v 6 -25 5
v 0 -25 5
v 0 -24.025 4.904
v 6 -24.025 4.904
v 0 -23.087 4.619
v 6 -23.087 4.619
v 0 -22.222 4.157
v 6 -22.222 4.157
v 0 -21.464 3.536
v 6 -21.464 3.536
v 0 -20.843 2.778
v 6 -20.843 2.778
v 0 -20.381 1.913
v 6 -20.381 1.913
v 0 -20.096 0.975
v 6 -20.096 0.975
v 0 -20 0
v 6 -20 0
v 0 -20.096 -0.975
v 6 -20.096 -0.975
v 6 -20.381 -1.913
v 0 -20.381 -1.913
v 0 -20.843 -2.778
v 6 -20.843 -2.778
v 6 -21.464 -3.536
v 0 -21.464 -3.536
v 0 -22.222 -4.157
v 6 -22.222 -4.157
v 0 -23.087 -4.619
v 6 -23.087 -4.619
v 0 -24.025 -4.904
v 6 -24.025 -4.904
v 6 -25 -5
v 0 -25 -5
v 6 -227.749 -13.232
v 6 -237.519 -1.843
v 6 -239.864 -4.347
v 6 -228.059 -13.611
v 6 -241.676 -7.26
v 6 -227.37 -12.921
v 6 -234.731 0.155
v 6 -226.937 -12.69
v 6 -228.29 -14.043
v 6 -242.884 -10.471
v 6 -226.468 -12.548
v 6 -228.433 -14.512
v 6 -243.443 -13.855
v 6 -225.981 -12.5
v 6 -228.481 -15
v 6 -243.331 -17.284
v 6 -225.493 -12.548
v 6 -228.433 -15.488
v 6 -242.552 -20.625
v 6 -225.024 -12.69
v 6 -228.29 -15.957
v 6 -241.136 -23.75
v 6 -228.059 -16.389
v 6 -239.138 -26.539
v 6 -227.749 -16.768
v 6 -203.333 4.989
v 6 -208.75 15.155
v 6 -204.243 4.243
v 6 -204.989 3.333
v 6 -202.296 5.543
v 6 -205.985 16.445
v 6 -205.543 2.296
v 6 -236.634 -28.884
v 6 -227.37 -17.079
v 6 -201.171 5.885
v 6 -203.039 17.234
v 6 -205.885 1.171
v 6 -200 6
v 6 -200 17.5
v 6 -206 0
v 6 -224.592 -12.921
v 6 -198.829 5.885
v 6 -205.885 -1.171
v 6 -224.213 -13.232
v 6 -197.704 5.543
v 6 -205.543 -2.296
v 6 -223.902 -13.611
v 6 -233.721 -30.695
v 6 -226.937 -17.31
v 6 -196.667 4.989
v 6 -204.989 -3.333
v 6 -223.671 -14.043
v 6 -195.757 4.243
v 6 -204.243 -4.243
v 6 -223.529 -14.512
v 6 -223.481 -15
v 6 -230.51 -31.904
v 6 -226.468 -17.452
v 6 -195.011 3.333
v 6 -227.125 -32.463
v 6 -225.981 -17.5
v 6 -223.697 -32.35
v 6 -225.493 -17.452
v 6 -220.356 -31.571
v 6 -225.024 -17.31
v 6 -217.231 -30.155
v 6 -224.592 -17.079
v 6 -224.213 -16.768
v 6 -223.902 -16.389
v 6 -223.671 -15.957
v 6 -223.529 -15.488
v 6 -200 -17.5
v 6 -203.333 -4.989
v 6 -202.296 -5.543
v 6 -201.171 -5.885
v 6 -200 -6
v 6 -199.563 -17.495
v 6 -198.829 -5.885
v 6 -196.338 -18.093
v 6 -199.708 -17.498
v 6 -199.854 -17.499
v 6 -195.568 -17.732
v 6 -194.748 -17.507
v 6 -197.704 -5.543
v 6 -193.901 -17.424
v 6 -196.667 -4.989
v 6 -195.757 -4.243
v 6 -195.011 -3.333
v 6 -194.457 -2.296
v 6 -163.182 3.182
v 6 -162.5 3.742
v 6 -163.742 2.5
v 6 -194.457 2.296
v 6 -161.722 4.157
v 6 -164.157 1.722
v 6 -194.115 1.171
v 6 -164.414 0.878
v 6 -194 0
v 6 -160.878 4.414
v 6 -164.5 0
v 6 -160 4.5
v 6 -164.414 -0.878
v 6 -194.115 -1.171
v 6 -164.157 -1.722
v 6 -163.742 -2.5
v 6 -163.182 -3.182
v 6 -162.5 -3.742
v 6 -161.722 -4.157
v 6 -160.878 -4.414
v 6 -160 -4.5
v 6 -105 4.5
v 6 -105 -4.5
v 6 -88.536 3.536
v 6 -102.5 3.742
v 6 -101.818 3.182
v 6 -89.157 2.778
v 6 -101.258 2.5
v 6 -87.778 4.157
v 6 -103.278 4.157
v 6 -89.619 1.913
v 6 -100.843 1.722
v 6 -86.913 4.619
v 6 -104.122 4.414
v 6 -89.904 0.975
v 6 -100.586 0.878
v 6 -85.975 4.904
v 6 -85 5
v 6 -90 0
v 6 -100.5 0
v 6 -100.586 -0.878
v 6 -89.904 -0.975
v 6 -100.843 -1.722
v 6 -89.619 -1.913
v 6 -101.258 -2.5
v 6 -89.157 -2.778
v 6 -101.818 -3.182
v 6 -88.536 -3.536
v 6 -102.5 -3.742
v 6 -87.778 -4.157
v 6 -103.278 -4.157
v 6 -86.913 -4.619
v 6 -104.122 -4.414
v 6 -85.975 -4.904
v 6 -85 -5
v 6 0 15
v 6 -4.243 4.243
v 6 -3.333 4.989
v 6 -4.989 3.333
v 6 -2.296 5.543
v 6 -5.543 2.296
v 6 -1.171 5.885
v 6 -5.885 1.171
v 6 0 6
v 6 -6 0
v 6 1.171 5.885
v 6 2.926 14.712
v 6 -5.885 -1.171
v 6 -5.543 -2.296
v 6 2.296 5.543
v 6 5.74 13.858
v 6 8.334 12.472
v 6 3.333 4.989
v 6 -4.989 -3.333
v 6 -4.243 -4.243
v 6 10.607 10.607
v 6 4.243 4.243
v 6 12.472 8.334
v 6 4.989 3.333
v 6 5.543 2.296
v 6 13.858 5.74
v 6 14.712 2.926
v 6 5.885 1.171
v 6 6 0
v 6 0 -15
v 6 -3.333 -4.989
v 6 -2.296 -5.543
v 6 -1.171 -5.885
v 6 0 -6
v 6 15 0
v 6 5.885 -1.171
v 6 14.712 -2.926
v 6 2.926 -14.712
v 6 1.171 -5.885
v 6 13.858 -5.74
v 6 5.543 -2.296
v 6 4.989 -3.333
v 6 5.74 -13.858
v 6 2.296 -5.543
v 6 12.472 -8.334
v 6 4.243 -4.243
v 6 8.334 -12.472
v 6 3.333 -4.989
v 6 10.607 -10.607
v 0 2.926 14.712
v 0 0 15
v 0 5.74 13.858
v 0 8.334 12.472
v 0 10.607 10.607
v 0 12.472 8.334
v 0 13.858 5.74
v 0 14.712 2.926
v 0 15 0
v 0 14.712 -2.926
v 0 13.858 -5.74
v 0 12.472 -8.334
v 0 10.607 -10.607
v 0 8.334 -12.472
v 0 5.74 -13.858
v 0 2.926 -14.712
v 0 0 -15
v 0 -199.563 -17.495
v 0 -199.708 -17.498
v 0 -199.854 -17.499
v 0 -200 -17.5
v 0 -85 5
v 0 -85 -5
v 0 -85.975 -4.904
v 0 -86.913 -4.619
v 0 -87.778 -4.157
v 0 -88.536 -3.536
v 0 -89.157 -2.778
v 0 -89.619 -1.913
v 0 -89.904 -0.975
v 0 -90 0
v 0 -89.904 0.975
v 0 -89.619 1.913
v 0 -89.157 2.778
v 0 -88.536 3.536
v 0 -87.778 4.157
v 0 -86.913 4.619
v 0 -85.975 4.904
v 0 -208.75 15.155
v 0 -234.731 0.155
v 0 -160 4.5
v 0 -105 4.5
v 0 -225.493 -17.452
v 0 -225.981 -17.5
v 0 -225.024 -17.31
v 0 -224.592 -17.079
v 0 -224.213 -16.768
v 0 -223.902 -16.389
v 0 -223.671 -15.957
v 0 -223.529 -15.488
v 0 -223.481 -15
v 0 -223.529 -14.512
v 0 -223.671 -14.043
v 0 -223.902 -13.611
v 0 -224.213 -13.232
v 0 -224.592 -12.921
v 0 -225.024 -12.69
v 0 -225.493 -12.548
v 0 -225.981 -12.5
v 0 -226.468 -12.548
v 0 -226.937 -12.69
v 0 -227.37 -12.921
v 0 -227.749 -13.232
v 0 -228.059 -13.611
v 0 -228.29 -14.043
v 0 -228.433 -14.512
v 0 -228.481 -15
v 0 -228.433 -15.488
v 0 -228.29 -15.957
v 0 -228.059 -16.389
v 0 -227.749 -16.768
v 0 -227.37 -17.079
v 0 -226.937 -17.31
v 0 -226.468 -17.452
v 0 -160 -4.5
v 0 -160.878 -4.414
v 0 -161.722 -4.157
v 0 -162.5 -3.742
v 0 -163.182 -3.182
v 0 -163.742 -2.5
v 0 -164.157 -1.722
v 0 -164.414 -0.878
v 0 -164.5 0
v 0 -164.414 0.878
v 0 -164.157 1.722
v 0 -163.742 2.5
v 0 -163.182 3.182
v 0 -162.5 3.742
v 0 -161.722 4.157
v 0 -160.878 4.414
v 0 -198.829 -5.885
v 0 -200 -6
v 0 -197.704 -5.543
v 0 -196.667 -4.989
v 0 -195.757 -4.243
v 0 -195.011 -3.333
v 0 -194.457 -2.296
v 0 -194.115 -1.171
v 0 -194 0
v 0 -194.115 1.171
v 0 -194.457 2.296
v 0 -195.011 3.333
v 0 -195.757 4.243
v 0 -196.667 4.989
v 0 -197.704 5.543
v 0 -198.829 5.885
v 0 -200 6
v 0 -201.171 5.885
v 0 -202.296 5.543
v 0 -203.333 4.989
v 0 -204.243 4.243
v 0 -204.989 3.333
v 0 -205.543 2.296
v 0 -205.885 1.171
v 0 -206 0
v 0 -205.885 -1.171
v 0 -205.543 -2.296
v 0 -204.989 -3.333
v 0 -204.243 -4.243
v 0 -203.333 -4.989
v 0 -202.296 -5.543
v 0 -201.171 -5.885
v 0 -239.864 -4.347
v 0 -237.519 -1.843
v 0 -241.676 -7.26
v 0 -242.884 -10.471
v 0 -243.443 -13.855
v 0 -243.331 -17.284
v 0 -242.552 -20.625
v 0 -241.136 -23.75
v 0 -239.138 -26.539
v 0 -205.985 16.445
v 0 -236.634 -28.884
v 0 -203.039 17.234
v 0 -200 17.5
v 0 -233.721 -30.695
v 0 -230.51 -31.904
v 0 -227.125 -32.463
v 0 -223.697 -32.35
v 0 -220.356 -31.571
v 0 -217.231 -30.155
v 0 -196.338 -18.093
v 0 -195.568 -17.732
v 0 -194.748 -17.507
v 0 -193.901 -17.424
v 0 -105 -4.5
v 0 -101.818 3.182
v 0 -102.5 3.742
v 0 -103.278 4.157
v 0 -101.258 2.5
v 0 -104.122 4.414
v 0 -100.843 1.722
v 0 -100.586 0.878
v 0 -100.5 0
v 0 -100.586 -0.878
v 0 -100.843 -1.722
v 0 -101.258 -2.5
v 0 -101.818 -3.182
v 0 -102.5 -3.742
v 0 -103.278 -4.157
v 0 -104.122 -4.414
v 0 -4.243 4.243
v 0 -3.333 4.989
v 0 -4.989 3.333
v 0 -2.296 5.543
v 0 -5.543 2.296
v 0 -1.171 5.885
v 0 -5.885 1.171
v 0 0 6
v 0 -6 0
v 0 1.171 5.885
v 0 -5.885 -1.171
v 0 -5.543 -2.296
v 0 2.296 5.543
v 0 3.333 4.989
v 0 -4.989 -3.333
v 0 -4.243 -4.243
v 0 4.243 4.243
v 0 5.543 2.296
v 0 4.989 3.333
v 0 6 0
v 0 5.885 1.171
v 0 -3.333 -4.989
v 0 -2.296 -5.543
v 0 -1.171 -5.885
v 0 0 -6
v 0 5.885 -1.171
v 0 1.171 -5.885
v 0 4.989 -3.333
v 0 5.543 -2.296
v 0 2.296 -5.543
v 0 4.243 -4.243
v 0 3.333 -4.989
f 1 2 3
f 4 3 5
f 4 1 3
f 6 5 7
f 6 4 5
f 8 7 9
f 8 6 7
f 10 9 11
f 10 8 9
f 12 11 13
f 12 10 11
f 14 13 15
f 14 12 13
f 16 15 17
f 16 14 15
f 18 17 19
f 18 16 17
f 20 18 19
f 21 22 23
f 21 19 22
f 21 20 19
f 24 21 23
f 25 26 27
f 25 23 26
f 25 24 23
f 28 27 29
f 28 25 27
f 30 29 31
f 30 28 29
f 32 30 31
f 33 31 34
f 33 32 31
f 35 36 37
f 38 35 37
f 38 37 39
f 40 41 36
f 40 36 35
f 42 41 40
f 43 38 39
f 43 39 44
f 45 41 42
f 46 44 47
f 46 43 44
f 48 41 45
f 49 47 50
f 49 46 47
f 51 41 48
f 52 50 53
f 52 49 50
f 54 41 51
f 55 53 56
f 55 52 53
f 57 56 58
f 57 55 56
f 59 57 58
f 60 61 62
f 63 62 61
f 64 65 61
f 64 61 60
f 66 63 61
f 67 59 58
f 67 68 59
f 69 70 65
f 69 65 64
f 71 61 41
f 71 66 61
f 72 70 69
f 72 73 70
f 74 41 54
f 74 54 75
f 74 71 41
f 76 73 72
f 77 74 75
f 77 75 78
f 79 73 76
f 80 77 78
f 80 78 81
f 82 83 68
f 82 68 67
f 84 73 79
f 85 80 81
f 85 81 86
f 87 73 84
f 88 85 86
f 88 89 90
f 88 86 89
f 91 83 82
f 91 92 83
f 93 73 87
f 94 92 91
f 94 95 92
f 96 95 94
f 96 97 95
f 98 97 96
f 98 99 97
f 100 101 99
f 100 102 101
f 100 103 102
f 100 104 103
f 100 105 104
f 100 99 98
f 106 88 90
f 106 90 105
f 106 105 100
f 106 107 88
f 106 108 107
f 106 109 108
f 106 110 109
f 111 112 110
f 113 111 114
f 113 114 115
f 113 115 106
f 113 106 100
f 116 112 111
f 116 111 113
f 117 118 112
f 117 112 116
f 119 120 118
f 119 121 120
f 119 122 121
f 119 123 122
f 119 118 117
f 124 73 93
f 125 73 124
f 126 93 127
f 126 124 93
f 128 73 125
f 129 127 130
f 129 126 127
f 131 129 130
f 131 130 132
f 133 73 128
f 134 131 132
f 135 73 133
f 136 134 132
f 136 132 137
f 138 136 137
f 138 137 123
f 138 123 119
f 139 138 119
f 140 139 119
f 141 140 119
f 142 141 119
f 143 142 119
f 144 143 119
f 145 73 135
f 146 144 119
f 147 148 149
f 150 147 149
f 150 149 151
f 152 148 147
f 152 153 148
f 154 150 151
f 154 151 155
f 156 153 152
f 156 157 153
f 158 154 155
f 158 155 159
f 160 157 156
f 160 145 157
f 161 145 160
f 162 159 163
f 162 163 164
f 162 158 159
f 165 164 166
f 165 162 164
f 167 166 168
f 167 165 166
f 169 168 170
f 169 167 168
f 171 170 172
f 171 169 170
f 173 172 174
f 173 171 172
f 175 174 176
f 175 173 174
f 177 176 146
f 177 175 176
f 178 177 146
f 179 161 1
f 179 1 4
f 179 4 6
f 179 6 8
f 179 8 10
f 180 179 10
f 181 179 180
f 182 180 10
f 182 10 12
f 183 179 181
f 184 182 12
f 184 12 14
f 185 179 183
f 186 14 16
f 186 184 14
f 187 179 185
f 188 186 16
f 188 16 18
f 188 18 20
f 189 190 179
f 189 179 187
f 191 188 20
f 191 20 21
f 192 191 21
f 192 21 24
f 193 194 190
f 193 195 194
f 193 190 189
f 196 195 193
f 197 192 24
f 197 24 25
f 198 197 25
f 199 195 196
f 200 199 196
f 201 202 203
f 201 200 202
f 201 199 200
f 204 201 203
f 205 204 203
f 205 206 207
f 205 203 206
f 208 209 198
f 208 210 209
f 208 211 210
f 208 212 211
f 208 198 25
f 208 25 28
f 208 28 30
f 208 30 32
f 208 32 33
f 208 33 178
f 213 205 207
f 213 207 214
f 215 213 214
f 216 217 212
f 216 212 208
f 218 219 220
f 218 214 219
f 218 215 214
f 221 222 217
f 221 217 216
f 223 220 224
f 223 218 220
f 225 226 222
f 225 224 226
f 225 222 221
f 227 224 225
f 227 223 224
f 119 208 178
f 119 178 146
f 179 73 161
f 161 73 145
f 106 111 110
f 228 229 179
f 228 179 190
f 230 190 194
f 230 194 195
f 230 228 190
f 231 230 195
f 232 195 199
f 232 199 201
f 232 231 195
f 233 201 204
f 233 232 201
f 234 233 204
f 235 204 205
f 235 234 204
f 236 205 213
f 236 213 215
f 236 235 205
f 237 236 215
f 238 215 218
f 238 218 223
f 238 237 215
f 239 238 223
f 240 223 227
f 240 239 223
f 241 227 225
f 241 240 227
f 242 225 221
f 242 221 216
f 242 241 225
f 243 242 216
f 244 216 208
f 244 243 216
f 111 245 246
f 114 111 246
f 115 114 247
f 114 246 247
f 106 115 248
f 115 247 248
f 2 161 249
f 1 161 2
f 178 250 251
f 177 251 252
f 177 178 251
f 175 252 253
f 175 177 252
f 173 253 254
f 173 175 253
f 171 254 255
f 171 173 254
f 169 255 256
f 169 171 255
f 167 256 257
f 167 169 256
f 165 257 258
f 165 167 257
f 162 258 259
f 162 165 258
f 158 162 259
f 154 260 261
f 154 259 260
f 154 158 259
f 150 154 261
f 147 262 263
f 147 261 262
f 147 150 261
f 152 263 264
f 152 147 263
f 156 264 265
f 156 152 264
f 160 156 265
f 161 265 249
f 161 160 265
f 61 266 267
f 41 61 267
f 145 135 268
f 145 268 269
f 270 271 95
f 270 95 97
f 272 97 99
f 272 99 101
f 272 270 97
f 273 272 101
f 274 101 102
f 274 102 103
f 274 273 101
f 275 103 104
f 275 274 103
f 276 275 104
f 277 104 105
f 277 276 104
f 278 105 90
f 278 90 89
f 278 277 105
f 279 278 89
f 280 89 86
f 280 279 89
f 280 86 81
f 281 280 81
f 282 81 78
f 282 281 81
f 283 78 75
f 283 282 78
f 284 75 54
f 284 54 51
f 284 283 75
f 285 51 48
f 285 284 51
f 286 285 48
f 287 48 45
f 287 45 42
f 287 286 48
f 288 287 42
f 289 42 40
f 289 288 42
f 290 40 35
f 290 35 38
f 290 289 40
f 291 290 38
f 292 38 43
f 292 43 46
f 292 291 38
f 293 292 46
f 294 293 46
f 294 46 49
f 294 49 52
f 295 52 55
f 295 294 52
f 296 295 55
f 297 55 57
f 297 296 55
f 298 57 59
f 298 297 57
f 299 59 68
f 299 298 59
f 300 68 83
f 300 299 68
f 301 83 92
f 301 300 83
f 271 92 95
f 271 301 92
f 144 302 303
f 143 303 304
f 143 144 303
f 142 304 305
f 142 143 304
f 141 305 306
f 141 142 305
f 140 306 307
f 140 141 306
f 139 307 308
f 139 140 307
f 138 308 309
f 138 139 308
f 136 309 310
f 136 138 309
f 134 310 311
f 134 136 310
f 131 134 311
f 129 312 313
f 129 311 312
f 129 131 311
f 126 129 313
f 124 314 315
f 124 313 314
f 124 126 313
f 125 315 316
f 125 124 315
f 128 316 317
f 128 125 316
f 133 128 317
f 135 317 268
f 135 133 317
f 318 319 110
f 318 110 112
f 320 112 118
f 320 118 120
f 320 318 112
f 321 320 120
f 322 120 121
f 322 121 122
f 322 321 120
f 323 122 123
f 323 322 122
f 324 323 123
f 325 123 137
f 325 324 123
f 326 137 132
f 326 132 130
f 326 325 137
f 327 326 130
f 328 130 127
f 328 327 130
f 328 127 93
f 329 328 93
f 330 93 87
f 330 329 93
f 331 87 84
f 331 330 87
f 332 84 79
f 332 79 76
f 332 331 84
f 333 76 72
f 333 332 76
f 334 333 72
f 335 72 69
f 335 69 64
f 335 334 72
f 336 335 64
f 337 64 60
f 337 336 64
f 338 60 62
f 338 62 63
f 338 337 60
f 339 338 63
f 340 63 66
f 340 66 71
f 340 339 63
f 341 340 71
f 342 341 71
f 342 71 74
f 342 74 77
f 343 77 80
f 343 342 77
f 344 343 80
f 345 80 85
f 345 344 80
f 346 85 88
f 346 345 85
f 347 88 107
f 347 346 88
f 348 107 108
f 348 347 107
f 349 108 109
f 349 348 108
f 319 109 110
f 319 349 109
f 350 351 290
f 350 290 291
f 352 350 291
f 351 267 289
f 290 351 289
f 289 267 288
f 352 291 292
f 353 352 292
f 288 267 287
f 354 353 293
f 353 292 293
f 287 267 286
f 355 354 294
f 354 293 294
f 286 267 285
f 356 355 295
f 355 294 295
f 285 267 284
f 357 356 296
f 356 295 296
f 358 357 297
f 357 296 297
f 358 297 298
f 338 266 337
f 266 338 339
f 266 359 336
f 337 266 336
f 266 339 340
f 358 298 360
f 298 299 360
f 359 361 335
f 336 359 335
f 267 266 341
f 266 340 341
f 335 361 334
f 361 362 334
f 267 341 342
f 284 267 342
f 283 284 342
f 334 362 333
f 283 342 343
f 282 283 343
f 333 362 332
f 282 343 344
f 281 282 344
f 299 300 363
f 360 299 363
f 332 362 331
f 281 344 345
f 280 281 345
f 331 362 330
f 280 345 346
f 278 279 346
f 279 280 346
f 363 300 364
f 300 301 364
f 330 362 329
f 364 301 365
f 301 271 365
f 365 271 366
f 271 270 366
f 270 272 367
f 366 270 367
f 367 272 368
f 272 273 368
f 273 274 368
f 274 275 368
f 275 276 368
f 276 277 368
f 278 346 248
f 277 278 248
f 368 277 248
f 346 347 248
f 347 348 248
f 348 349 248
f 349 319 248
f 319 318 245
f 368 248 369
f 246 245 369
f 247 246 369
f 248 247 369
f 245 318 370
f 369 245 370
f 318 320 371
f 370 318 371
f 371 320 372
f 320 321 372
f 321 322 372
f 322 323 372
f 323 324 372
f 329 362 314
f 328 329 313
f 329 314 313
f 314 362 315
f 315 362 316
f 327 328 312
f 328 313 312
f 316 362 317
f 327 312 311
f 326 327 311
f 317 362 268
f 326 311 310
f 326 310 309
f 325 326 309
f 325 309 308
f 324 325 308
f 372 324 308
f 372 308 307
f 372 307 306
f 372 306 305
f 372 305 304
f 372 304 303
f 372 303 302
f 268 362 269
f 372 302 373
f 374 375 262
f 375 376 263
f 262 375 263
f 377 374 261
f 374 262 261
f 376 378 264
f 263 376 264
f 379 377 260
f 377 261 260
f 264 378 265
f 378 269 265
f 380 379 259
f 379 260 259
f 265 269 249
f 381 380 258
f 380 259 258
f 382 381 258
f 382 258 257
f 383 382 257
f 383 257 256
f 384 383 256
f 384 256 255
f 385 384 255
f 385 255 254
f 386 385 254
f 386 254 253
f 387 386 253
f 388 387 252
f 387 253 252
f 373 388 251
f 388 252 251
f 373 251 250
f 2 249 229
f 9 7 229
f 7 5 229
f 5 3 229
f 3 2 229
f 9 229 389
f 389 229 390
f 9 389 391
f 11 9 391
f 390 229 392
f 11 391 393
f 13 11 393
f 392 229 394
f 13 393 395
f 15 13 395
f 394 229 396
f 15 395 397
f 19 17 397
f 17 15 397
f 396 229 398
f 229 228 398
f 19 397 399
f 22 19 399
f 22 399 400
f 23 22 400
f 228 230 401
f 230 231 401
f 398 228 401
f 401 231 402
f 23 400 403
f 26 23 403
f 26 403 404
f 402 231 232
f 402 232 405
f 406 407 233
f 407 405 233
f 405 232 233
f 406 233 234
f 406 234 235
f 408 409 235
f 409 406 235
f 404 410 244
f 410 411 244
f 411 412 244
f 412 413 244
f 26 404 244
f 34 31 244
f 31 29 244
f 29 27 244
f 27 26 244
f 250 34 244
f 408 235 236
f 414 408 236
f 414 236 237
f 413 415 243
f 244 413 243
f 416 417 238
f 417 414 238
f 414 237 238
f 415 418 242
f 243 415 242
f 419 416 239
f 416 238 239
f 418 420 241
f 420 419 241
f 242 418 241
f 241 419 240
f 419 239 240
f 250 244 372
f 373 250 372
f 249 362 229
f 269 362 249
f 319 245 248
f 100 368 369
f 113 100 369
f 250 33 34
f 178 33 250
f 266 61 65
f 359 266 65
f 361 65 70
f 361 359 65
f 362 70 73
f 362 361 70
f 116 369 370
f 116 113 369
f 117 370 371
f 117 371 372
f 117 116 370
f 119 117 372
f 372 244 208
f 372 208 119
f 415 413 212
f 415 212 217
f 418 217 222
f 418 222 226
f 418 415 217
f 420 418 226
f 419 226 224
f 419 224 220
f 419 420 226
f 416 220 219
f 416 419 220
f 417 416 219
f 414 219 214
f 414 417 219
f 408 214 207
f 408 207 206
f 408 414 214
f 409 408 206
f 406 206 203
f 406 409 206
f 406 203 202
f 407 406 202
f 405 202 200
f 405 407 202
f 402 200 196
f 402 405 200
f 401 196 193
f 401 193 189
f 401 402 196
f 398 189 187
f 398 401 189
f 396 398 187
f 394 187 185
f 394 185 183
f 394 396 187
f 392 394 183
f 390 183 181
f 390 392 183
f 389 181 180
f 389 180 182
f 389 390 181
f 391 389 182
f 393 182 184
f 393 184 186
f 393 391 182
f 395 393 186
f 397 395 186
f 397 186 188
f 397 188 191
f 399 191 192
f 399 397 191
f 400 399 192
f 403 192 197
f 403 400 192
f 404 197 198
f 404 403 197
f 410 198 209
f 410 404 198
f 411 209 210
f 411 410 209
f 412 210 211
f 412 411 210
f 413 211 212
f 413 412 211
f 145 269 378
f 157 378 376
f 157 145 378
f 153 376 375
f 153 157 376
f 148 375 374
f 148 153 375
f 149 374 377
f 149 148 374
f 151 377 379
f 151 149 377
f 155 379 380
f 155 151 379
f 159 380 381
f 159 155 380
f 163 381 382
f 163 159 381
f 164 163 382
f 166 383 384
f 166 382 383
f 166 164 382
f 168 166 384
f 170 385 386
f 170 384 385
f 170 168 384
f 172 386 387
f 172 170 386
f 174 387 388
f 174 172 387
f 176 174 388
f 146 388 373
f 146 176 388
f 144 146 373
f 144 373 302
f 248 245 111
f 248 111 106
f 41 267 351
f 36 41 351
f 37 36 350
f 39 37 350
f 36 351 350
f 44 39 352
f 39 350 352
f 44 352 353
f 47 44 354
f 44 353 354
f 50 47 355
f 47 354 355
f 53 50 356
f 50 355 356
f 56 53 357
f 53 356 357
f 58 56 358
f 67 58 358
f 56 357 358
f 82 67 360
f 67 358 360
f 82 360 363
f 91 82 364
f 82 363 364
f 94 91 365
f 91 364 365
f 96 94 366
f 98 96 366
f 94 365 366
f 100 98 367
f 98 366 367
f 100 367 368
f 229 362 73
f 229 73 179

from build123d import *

# Parameters (mm, degrees)
SKETCH_1_R          = 6
EXTRUDE_1_DEPTH     = 6
CUT_EXTRUDE_1_DEPTH = 10
EXTRUDE_START       = -6
SKETCH_3_R          = 2.5
EXTRUDE_2_DEPTH     = 6
FILLET_2_R          = 5


with BuildPart() as part:
    # 草图1 → 凸台-拉伸1 (new body)
    with BuildSketch(Plane(origin=(0, 0, 0), x_dir=(0, 0, -1), z_dir=(1, 0, 0))):
        with BuildLine():
            Line((15, 0), (17.5, -200))
            ThreePointArc((17.5, -200), (0, -217.5), (-17.5, -200))
            Line((-17.5, -200), (-15, 0))
            ThreePointArc((-15, 0), (0, 15), (15, 0))
        make_face()
        Circle(SKETCH_1_R, mode=Mode.SUBTRACT)
        with Locations((0, -200)):
            Circle(SKETCH_1_R, mode=Mode.SUBTRACT)
    extrude(amount=EXTRUDE_1_DEPTH)

    # 草图2 → 切除-拉伸1 (cut)
    with BuildSketch(Plane(origin=(6, 0, 0), x_dir=(0, 0, -1), z_dir=(1, 0, 0))):
        with BuildLine():
            Line((5, -25), (5, -85))
            ThreePointArc((5, -85), (0, -90), (-5, -85))
            Line((-5, -85), (-5, -25))
            ThreePointArc((-5, -25), (0, -20), (5, -25))
        make_face()
        with BuildLine():
            Line((4.5, -105), (4.5, -160))
            ThreePointArc((4.5, -160), (0, -164.5), (-4.5, -160))
            Line((-4.5, -160), (-4.5, -105))
            ThreePointArc((-4.5, -105), (0, -100.5), (4.5, -105))
        make_face()
    extrude(amount=-CUT_EXTRUDE_1_DEPTH, mode=Mode.SUBTRACT)

    # 草图3 → 凸台-拉伸2 (add)
    with BuildSketch(Plane(origin=(6, 0, 0), x_dir=(0, 0, -1), z_dir=(1, 0, 0)).offset(EXTRUDE_START)):
        with BuildLine():
            Line((-15.155444566, -208.75), (-0.155444566, -234.730762114))
            ThreePointArc((-0.155444566, -234.730762114), (23.75, -241.13620668), (30.155444566, -217.230762114))
            Line((30.155444566, -217.230762114), (17.440089003, -195.207120242))
            Line((17.440089003, -195.207120242), (17.494532104, -199.562568349))
            ThreePointArc((17.494532104, -199.562568349), (15.263627142, -208.559888228), (8.75, -215.155444566))
            ThreePointArc((8.75, -215.155444566), (-4.529333289, -216.90370196), (-15.155444566, -208.75))
        make_face()
        with Locations((15, -225.980762114)):
            Circle(SKETCH_3_R, mode=Mode.SUBTRACT)
    extrude(amount=EXTRUDE_2_DEPTH)

    # 圆角2
    fillet_2_edges = [part.edges().sort_by_distance(p)[0] for p in [
        (3, -195.207120242, -17.440089003),
    ]]
    fillet(fillet_2_edges, radius=FILLET_2_R)


solid = part.part
